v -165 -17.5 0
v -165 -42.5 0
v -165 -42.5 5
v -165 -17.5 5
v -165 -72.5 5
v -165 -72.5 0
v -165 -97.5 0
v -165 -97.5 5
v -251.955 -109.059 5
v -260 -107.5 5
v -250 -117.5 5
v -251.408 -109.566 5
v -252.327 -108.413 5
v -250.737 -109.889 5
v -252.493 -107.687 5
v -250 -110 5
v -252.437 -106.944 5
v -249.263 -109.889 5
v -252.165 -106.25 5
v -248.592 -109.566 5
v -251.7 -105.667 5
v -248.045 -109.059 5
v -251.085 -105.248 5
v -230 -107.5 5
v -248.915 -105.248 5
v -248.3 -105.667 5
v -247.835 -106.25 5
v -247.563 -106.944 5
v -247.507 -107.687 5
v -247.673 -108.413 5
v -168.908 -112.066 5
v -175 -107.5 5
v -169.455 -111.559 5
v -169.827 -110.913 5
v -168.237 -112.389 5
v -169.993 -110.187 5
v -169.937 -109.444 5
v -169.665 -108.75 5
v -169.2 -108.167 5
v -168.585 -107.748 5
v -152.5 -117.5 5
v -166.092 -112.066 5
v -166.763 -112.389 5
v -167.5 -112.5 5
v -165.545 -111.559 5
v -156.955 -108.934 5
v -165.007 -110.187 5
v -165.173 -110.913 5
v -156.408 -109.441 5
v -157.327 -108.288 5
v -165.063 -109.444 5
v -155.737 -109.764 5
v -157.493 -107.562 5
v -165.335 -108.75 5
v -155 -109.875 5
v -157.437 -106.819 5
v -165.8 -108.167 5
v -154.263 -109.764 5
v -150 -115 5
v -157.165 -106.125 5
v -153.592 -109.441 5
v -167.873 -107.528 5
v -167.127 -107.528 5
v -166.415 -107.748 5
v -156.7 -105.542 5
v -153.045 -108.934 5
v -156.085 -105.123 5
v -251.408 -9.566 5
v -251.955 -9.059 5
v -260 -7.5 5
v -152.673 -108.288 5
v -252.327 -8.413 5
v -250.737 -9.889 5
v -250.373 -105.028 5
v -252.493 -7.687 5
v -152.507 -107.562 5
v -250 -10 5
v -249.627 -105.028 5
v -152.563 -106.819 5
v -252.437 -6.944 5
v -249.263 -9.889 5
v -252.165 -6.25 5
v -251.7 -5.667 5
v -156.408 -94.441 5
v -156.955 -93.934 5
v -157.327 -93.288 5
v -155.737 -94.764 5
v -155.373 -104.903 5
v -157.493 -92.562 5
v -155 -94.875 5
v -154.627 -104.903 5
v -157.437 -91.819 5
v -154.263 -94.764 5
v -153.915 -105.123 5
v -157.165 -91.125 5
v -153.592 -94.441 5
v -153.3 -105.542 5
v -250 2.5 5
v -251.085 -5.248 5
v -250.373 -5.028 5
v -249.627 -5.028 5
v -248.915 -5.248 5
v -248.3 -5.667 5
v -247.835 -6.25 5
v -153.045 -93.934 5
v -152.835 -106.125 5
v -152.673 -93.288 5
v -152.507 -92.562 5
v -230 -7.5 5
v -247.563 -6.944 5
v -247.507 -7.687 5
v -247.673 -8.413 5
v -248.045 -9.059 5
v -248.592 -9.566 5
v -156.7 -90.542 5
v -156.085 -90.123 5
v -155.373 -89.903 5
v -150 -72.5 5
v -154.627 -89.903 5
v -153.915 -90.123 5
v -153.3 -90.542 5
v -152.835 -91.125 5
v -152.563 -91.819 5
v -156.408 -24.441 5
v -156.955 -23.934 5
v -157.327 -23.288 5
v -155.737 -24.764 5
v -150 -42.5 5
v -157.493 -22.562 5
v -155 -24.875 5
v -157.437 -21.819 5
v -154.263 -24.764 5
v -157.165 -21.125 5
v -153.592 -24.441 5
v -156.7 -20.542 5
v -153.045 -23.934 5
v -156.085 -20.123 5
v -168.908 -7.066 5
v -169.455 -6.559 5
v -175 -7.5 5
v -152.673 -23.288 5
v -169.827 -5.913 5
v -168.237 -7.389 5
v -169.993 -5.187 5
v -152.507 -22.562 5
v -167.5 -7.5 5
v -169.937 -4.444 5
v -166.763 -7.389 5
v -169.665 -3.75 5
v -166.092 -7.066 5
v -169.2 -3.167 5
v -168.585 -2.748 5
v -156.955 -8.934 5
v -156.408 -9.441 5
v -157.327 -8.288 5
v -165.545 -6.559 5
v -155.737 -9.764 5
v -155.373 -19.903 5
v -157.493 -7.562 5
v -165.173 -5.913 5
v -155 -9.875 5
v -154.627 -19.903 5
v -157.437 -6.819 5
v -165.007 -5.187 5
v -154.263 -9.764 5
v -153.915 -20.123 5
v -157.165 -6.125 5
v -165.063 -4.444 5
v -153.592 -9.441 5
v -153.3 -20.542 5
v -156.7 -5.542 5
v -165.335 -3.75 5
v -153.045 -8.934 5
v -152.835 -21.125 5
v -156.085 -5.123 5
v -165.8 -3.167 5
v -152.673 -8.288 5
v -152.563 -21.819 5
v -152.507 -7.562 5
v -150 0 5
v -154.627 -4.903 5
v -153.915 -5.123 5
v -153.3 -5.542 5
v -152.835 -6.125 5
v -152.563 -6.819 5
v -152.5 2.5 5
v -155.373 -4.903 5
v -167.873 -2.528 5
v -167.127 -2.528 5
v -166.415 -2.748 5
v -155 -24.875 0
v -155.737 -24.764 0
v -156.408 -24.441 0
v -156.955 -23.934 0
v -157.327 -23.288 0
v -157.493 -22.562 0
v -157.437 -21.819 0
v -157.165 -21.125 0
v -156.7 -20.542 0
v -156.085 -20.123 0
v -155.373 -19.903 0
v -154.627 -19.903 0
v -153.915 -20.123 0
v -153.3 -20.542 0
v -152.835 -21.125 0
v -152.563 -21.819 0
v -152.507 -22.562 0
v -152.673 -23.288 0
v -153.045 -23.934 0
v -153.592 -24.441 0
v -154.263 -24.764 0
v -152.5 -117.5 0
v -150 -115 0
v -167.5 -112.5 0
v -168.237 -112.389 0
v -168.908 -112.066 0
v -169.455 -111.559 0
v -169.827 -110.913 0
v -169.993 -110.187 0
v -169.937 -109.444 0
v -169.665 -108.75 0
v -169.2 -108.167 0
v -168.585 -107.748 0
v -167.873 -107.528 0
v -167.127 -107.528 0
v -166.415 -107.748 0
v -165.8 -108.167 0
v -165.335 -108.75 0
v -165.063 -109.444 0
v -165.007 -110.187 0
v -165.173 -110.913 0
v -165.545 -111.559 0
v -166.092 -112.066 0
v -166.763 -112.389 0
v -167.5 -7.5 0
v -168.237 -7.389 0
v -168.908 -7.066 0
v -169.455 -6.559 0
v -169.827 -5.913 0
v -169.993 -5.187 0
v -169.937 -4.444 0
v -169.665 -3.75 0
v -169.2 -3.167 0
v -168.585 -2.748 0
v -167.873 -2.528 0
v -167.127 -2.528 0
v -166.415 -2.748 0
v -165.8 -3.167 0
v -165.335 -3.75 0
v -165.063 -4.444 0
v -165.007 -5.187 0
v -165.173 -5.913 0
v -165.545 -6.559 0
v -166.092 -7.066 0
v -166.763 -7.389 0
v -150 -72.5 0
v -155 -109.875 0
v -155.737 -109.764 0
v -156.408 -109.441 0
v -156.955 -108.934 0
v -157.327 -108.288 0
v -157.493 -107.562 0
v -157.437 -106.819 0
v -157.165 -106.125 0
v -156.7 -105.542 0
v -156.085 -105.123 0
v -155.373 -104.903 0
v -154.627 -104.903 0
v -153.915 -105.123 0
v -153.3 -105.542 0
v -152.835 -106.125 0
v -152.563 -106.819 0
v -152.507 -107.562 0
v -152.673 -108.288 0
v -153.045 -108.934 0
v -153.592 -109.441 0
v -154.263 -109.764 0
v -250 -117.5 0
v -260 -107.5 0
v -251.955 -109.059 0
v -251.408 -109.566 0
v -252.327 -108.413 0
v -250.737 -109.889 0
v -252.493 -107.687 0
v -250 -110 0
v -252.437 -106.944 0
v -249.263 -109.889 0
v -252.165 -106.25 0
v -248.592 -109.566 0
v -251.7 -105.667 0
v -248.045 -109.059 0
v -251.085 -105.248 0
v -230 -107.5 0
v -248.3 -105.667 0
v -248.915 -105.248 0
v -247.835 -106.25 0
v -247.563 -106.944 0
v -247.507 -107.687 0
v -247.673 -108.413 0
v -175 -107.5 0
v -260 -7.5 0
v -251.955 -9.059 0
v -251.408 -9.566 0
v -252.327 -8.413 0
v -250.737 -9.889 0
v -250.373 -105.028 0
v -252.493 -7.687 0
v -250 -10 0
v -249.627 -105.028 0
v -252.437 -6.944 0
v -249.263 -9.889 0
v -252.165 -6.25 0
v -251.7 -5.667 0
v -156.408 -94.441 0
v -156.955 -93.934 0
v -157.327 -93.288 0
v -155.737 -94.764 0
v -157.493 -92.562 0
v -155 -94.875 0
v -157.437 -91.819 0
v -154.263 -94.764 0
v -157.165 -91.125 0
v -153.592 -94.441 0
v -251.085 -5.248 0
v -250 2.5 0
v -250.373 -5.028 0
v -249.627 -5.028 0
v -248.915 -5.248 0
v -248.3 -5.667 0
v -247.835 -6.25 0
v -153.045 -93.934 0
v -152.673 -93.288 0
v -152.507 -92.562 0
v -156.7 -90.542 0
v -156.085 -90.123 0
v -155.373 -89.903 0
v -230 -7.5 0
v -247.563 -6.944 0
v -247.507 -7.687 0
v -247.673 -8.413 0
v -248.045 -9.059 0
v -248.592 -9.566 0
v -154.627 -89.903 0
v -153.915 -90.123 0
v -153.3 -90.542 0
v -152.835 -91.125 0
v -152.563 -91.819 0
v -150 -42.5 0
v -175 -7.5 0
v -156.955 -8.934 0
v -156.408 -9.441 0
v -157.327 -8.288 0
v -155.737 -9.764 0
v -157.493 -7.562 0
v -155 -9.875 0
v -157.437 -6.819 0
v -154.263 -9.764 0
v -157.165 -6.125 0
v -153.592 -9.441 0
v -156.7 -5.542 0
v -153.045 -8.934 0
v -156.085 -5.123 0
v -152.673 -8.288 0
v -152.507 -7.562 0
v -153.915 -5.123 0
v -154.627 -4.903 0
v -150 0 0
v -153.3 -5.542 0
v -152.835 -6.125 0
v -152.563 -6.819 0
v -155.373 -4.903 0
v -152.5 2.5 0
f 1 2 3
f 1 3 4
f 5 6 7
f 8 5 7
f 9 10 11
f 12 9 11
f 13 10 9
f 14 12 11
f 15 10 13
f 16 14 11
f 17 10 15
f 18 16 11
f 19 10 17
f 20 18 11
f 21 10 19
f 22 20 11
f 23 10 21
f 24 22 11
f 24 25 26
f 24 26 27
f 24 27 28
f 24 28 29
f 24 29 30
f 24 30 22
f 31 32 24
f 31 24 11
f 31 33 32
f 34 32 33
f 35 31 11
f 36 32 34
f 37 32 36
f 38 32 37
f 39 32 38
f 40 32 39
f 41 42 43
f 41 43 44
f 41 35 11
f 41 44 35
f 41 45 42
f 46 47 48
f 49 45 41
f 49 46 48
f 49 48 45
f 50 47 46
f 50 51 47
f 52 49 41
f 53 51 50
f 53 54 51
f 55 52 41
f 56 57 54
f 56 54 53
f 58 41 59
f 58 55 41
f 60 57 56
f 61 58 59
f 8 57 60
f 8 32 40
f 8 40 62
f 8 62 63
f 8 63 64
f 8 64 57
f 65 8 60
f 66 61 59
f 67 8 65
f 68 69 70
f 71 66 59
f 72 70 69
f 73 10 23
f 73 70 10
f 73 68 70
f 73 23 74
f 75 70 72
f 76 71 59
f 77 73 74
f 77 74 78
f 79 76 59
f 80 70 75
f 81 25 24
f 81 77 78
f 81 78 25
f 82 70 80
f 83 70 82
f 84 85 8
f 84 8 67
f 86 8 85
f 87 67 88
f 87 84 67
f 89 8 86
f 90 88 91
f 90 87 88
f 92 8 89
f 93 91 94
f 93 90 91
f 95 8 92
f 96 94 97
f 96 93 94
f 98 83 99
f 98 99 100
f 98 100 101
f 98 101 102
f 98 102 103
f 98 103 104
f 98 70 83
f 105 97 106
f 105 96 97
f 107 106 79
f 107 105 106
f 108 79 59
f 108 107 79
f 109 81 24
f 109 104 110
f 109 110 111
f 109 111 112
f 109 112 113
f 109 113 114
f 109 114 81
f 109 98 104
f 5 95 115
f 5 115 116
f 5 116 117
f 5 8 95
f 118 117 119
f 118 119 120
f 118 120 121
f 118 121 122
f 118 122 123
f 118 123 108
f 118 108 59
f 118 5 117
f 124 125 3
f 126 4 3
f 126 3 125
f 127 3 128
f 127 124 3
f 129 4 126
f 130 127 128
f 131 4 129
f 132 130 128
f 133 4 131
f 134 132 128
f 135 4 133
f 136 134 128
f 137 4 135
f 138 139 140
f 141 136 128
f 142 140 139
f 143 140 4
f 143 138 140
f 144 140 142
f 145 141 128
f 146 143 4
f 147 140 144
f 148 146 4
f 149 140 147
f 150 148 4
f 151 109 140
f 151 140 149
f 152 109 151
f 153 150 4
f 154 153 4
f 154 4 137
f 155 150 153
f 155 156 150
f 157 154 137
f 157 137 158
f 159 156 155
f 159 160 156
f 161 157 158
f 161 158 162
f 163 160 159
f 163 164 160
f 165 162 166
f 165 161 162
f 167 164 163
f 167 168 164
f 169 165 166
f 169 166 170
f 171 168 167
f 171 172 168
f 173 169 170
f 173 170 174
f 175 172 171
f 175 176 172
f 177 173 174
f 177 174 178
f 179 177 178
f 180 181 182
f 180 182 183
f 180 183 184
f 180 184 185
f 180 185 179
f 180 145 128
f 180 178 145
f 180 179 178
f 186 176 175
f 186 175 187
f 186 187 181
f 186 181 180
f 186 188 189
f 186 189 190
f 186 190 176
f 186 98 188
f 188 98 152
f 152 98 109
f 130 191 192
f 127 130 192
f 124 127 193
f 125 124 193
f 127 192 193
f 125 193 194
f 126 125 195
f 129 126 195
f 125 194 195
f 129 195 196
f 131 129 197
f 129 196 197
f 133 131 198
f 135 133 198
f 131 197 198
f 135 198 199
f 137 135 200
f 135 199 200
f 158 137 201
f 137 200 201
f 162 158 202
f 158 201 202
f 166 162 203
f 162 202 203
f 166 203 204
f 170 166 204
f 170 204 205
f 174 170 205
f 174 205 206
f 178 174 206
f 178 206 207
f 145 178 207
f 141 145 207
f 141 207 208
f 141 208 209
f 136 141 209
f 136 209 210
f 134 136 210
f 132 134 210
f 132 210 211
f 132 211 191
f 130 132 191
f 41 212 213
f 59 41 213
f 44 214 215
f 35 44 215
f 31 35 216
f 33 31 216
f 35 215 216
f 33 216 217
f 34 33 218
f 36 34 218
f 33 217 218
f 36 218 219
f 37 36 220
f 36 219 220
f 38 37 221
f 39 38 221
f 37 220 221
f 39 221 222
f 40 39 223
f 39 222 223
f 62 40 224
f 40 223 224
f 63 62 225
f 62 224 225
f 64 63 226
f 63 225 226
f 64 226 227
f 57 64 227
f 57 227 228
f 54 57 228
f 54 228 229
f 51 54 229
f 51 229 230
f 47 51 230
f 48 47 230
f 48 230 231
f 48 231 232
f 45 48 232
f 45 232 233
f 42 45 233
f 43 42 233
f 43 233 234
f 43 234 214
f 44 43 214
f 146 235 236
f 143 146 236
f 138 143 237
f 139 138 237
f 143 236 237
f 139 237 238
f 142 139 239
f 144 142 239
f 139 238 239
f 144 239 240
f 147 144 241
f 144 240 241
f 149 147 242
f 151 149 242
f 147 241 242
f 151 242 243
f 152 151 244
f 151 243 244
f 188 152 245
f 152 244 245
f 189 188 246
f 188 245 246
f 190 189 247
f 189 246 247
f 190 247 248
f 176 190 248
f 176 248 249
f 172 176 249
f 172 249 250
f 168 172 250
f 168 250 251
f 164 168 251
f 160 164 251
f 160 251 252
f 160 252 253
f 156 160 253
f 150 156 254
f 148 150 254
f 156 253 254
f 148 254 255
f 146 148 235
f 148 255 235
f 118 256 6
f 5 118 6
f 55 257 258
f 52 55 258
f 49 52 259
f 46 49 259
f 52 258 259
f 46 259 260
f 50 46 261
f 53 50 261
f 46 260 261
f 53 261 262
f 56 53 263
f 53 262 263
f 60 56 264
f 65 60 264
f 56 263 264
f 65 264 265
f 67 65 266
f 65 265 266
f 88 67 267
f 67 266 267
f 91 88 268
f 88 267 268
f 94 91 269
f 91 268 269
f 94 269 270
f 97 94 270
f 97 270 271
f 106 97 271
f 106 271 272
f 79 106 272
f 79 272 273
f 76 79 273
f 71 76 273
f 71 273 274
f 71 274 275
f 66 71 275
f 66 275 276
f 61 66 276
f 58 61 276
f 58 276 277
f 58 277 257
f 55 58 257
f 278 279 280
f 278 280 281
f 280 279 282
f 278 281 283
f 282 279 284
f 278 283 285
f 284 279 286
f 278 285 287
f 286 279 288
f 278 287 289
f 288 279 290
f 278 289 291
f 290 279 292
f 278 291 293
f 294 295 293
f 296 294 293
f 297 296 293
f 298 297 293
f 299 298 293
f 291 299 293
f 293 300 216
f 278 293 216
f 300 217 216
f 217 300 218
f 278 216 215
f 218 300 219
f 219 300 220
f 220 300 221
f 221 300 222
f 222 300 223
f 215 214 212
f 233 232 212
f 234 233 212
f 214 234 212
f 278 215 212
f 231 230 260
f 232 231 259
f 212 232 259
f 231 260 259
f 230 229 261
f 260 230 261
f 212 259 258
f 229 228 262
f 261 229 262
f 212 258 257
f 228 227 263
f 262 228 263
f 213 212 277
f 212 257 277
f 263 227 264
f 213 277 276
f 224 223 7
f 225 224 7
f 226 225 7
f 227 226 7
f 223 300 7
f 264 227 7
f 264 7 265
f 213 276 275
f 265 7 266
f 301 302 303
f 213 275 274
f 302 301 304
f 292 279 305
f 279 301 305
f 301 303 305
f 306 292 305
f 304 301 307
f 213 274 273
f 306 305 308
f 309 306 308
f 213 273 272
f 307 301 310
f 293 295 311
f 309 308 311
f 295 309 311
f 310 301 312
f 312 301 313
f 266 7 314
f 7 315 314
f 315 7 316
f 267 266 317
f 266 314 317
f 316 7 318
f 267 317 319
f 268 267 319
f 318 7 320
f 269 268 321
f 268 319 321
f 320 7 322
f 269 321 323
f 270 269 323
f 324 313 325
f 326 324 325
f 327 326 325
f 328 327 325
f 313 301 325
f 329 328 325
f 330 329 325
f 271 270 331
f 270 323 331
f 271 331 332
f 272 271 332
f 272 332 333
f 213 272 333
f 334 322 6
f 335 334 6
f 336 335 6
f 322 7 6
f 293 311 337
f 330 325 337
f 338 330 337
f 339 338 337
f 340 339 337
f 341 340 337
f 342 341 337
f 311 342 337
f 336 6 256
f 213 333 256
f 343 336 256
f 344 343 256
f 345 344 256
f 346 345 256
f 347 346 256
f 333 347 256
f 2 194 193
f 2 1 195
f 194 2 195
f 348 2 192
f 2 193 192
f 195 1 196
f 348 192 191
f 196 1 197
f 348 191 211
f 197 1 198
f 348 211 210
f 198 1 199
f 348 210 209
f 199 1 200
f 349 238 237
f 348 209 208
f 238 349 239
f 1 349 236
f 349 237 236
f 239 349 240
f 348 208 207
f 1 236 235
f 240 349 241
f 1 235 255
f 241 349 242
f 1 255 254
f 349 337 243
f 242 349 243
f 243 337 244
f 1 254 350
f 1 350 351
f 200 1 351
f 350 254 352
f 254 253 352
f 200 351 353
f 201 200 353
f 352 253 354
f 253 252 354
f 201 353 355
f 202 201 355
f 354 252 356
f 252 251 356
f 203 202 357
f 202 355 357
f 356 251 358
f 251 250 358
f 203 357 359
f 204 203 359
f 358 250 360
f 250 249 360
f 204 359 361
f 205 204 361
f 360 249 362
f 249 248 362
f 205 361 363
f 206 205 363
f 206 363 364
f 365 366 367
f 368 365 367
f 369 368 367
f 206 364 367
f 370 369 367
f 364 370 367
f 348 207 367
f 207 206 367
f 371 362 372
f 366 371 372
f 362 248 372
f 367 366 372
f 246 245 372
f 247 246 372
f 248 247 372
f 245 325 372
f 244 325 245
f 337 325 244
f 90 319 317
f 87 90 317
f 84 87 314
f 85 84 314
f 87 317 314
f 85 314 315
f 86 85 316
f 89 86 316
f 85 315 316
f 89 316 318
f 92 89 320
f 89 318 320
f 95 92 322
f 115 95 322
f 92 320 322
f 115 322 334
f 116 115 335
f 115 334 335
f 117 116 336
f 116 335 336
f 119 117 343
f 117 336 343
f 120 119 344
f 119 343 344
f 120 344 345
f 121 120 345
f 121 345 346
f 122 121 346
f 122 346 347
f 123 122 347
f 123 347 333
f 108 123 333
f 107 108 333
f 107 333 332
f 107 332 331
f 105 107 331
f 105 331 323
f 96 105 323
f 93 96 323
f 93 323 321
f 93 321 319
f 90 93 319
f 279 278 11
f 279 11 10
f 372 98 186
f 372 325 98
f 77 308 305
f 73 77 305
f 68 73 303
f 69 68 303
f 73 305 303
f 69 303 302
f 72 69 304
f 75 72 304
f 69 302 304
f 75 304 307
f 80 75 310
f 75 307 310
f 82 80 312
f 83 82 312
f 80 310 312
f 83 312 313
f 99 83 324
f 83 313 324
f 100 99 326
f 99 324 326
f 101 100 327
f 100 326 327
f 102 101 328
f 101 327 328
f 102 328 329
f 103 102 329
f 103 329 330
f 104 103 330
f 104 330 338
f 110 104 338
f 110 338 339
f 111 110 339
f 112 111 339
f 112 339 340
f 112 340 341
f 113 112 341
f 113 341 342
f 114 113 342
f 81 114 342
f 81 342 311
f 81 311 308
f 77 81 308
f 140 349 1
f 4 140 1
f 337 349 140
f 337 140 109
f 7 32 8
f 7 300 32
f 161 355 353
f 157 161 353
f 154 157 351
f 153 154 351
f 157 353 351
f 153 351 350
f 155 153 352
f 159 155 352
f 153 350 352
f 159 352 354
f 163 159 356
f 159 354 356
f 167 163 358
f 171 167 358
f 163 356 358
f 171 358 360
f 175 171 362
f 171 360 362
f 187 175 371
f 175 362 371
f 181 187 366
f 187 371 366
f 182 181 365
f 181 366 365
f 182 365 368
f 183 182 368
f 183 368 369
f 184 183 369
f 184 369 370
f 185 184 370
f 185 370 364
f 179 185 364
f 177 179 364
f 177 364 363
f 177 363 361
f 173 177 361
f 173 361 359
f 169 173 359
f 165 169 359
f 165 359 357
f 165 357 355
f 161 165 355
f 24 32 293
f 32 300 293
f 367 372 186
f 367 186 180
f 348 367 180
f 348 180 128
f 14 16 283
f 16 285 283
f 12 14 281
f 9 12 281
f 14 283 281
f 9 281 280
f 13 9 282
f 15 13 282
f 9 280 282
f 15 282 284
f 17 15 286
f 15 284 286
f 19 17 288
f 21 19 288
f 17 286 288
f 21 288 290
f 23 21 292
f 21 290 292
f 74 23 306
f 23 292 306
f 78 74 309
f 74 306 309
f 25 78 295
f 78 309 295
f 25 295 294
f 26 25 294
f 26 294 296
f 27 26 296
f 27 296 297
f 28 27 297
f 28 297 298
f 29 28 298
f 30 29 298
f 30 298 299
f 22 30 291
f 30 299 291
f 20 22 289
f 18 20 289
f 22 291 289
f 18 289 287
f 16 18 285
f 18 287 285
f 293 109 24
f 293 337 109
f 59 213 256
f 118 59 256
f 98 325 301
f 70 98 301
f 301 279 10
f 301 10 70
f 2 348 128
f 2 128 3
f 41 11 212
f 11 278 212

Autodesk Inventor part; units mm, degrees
ref_plane "YZ Plane" through (0, 0, 0) normal (1, 0, 0) x (0, 1, 0)
ref_plane "XZ Plane" through (0, 0, 0) normal (0, 1, 0) x (-1, 0, 0)
ref_plane "XY Plane" through (0, 0, 0) normal (0, 0, 1) x (1, 0, 0)
sketch "Sketch1" plane through (0, 0, 0) normal (0, 0, 1) x (1, 0, 0)
  line L0 (-175, -7.5) -> (-230, -7.5)
  line L1 (-250, 2.5) -> (-152.5, 2.5)
  line L2 (-82.5, -57.5) -> (-255, -57.5)
  line L3 (-150, -42.5) -> (-165, -42.5)
  line L4 (-150, 0) -> (-150, -42.5)
  line L5 (-175, -7.5) -> (-165, -17.5)
  line L6 (-165, -42.5) -> (-165, -17.5)
  line L7 (-175, -107.5) -> (-230, -107.5)
  line L8 (-250, -117.5) -> (-152.5, -117.5)
  line L9 (-150, -72.5) -> (-165, -72.5)
  line L10 (-150, -115) -> (-150, -72.5)
  line L11 (-175, -107.5) -> (-165, -97.5)
  line L12 (-165, -72.5) -> (-165, -97.5)
  line L13 (-230, -7.5) -> (-230, -107.5)
  line L14 (-260, -107.5) -> (-260, -7.5)
  line L15 (-250, 2.5) -> (-260, -7.5)
  line L16 (-250, -117.5) -> (-260, -107.5)
  line L17 (-152.5, 2.5) -> (-150, 0)
  line L18 (-152.5, -117.5) -> (-150, -115)
  point P0 (0, 0)
  point P1 (-260, 2.5)
  point P2 (-152.5, 2.5)
  point P3 (-260, -117.5)
  point P4 (-150, 2.5)
  point P5 (-150, -117.5)
  dimension "d2" = -7.5
  dimension "d4" = 10
  dimension "d40" = 15
  dimension "d53" = 10
  dimension "d54" = 10
  dimension "d56" = 65
  dimension "d57" = 30
  dimension "d58" = 10
  dimension "d59" = 10
  dimension "d60" = 10
  dimension "d61" = 10
  dimension "d69" = 45
  dimension "d70" = 2.5
  dimension "d71" = 2.5
  dimension "d72" = 2.5
  dimension "d73" = 2.5
extrude "Extrusion1" add sketch "Sketch1" along normal blind 5
sketch "Sketch3" plane through (0, 0, 5) normal (0, 0, 1) x (1, 0, 0)
  line L0 (-155, 3.7259) -> (-155, -113.632) construction
  line L1 (-150, -42.5) -> (-150, 0) construction
  line L2 (-225, -107.5) -> (-225, -7.5) construction
  line L3 (-225, -57.375) -> (-3.3098, -57.375) construction
  point P0 (0, 0)
  point P1 (-150, 5)
  point P2 (-155, -7.375)
  point P3 (-155, -22.375)
  point P4 (-155, -92.375)
  point P5 (-155, -107.375)
  point P6 (-230, -7.5)
  dimension "d41" = 5
  dimension "d42" = 15
  dimension "d43" = 70
hole "Hole2" at (-155, -7.375, 5) at (-155, -22.375, 5) at (-155, -92.375, 5) at (-155, -107.375, 5) direction (0, 0, -1) diameter 5 end through all
sketch "Sketch4" plane through (0, 0, 5) normal (0, 0, 1) x (1, 0, 0)
  circle A0 centre (-250, -7.5) radius 2.5 projected
  circle A1 centre (-250, -107.5) radius 2.5 projected
  circle A2 centre (-167.5, -5) radius 2.5 projected
  circle A3 centre (-167.5, -110) radius 2.5 projected
  point P0 (0, 0)
hole "Hole3" at (-167.5, -5, 5) at (-167.5, -110, 5) at (-250, -107.5, 5) at (-250, -7.5, 5) direction (0, 0, -1) diameter 5 end through all
equation "\"d59\" = d58"
equation "\"d60\" = d58"
equation "\"d61\" = d60"
equation "\"d71\" = d70"
equation "\"d72\" = d70"
equation "\"d73\" = d72"
properties part number "MarcoV2" material "MDF Medium Density Fiberboard"
